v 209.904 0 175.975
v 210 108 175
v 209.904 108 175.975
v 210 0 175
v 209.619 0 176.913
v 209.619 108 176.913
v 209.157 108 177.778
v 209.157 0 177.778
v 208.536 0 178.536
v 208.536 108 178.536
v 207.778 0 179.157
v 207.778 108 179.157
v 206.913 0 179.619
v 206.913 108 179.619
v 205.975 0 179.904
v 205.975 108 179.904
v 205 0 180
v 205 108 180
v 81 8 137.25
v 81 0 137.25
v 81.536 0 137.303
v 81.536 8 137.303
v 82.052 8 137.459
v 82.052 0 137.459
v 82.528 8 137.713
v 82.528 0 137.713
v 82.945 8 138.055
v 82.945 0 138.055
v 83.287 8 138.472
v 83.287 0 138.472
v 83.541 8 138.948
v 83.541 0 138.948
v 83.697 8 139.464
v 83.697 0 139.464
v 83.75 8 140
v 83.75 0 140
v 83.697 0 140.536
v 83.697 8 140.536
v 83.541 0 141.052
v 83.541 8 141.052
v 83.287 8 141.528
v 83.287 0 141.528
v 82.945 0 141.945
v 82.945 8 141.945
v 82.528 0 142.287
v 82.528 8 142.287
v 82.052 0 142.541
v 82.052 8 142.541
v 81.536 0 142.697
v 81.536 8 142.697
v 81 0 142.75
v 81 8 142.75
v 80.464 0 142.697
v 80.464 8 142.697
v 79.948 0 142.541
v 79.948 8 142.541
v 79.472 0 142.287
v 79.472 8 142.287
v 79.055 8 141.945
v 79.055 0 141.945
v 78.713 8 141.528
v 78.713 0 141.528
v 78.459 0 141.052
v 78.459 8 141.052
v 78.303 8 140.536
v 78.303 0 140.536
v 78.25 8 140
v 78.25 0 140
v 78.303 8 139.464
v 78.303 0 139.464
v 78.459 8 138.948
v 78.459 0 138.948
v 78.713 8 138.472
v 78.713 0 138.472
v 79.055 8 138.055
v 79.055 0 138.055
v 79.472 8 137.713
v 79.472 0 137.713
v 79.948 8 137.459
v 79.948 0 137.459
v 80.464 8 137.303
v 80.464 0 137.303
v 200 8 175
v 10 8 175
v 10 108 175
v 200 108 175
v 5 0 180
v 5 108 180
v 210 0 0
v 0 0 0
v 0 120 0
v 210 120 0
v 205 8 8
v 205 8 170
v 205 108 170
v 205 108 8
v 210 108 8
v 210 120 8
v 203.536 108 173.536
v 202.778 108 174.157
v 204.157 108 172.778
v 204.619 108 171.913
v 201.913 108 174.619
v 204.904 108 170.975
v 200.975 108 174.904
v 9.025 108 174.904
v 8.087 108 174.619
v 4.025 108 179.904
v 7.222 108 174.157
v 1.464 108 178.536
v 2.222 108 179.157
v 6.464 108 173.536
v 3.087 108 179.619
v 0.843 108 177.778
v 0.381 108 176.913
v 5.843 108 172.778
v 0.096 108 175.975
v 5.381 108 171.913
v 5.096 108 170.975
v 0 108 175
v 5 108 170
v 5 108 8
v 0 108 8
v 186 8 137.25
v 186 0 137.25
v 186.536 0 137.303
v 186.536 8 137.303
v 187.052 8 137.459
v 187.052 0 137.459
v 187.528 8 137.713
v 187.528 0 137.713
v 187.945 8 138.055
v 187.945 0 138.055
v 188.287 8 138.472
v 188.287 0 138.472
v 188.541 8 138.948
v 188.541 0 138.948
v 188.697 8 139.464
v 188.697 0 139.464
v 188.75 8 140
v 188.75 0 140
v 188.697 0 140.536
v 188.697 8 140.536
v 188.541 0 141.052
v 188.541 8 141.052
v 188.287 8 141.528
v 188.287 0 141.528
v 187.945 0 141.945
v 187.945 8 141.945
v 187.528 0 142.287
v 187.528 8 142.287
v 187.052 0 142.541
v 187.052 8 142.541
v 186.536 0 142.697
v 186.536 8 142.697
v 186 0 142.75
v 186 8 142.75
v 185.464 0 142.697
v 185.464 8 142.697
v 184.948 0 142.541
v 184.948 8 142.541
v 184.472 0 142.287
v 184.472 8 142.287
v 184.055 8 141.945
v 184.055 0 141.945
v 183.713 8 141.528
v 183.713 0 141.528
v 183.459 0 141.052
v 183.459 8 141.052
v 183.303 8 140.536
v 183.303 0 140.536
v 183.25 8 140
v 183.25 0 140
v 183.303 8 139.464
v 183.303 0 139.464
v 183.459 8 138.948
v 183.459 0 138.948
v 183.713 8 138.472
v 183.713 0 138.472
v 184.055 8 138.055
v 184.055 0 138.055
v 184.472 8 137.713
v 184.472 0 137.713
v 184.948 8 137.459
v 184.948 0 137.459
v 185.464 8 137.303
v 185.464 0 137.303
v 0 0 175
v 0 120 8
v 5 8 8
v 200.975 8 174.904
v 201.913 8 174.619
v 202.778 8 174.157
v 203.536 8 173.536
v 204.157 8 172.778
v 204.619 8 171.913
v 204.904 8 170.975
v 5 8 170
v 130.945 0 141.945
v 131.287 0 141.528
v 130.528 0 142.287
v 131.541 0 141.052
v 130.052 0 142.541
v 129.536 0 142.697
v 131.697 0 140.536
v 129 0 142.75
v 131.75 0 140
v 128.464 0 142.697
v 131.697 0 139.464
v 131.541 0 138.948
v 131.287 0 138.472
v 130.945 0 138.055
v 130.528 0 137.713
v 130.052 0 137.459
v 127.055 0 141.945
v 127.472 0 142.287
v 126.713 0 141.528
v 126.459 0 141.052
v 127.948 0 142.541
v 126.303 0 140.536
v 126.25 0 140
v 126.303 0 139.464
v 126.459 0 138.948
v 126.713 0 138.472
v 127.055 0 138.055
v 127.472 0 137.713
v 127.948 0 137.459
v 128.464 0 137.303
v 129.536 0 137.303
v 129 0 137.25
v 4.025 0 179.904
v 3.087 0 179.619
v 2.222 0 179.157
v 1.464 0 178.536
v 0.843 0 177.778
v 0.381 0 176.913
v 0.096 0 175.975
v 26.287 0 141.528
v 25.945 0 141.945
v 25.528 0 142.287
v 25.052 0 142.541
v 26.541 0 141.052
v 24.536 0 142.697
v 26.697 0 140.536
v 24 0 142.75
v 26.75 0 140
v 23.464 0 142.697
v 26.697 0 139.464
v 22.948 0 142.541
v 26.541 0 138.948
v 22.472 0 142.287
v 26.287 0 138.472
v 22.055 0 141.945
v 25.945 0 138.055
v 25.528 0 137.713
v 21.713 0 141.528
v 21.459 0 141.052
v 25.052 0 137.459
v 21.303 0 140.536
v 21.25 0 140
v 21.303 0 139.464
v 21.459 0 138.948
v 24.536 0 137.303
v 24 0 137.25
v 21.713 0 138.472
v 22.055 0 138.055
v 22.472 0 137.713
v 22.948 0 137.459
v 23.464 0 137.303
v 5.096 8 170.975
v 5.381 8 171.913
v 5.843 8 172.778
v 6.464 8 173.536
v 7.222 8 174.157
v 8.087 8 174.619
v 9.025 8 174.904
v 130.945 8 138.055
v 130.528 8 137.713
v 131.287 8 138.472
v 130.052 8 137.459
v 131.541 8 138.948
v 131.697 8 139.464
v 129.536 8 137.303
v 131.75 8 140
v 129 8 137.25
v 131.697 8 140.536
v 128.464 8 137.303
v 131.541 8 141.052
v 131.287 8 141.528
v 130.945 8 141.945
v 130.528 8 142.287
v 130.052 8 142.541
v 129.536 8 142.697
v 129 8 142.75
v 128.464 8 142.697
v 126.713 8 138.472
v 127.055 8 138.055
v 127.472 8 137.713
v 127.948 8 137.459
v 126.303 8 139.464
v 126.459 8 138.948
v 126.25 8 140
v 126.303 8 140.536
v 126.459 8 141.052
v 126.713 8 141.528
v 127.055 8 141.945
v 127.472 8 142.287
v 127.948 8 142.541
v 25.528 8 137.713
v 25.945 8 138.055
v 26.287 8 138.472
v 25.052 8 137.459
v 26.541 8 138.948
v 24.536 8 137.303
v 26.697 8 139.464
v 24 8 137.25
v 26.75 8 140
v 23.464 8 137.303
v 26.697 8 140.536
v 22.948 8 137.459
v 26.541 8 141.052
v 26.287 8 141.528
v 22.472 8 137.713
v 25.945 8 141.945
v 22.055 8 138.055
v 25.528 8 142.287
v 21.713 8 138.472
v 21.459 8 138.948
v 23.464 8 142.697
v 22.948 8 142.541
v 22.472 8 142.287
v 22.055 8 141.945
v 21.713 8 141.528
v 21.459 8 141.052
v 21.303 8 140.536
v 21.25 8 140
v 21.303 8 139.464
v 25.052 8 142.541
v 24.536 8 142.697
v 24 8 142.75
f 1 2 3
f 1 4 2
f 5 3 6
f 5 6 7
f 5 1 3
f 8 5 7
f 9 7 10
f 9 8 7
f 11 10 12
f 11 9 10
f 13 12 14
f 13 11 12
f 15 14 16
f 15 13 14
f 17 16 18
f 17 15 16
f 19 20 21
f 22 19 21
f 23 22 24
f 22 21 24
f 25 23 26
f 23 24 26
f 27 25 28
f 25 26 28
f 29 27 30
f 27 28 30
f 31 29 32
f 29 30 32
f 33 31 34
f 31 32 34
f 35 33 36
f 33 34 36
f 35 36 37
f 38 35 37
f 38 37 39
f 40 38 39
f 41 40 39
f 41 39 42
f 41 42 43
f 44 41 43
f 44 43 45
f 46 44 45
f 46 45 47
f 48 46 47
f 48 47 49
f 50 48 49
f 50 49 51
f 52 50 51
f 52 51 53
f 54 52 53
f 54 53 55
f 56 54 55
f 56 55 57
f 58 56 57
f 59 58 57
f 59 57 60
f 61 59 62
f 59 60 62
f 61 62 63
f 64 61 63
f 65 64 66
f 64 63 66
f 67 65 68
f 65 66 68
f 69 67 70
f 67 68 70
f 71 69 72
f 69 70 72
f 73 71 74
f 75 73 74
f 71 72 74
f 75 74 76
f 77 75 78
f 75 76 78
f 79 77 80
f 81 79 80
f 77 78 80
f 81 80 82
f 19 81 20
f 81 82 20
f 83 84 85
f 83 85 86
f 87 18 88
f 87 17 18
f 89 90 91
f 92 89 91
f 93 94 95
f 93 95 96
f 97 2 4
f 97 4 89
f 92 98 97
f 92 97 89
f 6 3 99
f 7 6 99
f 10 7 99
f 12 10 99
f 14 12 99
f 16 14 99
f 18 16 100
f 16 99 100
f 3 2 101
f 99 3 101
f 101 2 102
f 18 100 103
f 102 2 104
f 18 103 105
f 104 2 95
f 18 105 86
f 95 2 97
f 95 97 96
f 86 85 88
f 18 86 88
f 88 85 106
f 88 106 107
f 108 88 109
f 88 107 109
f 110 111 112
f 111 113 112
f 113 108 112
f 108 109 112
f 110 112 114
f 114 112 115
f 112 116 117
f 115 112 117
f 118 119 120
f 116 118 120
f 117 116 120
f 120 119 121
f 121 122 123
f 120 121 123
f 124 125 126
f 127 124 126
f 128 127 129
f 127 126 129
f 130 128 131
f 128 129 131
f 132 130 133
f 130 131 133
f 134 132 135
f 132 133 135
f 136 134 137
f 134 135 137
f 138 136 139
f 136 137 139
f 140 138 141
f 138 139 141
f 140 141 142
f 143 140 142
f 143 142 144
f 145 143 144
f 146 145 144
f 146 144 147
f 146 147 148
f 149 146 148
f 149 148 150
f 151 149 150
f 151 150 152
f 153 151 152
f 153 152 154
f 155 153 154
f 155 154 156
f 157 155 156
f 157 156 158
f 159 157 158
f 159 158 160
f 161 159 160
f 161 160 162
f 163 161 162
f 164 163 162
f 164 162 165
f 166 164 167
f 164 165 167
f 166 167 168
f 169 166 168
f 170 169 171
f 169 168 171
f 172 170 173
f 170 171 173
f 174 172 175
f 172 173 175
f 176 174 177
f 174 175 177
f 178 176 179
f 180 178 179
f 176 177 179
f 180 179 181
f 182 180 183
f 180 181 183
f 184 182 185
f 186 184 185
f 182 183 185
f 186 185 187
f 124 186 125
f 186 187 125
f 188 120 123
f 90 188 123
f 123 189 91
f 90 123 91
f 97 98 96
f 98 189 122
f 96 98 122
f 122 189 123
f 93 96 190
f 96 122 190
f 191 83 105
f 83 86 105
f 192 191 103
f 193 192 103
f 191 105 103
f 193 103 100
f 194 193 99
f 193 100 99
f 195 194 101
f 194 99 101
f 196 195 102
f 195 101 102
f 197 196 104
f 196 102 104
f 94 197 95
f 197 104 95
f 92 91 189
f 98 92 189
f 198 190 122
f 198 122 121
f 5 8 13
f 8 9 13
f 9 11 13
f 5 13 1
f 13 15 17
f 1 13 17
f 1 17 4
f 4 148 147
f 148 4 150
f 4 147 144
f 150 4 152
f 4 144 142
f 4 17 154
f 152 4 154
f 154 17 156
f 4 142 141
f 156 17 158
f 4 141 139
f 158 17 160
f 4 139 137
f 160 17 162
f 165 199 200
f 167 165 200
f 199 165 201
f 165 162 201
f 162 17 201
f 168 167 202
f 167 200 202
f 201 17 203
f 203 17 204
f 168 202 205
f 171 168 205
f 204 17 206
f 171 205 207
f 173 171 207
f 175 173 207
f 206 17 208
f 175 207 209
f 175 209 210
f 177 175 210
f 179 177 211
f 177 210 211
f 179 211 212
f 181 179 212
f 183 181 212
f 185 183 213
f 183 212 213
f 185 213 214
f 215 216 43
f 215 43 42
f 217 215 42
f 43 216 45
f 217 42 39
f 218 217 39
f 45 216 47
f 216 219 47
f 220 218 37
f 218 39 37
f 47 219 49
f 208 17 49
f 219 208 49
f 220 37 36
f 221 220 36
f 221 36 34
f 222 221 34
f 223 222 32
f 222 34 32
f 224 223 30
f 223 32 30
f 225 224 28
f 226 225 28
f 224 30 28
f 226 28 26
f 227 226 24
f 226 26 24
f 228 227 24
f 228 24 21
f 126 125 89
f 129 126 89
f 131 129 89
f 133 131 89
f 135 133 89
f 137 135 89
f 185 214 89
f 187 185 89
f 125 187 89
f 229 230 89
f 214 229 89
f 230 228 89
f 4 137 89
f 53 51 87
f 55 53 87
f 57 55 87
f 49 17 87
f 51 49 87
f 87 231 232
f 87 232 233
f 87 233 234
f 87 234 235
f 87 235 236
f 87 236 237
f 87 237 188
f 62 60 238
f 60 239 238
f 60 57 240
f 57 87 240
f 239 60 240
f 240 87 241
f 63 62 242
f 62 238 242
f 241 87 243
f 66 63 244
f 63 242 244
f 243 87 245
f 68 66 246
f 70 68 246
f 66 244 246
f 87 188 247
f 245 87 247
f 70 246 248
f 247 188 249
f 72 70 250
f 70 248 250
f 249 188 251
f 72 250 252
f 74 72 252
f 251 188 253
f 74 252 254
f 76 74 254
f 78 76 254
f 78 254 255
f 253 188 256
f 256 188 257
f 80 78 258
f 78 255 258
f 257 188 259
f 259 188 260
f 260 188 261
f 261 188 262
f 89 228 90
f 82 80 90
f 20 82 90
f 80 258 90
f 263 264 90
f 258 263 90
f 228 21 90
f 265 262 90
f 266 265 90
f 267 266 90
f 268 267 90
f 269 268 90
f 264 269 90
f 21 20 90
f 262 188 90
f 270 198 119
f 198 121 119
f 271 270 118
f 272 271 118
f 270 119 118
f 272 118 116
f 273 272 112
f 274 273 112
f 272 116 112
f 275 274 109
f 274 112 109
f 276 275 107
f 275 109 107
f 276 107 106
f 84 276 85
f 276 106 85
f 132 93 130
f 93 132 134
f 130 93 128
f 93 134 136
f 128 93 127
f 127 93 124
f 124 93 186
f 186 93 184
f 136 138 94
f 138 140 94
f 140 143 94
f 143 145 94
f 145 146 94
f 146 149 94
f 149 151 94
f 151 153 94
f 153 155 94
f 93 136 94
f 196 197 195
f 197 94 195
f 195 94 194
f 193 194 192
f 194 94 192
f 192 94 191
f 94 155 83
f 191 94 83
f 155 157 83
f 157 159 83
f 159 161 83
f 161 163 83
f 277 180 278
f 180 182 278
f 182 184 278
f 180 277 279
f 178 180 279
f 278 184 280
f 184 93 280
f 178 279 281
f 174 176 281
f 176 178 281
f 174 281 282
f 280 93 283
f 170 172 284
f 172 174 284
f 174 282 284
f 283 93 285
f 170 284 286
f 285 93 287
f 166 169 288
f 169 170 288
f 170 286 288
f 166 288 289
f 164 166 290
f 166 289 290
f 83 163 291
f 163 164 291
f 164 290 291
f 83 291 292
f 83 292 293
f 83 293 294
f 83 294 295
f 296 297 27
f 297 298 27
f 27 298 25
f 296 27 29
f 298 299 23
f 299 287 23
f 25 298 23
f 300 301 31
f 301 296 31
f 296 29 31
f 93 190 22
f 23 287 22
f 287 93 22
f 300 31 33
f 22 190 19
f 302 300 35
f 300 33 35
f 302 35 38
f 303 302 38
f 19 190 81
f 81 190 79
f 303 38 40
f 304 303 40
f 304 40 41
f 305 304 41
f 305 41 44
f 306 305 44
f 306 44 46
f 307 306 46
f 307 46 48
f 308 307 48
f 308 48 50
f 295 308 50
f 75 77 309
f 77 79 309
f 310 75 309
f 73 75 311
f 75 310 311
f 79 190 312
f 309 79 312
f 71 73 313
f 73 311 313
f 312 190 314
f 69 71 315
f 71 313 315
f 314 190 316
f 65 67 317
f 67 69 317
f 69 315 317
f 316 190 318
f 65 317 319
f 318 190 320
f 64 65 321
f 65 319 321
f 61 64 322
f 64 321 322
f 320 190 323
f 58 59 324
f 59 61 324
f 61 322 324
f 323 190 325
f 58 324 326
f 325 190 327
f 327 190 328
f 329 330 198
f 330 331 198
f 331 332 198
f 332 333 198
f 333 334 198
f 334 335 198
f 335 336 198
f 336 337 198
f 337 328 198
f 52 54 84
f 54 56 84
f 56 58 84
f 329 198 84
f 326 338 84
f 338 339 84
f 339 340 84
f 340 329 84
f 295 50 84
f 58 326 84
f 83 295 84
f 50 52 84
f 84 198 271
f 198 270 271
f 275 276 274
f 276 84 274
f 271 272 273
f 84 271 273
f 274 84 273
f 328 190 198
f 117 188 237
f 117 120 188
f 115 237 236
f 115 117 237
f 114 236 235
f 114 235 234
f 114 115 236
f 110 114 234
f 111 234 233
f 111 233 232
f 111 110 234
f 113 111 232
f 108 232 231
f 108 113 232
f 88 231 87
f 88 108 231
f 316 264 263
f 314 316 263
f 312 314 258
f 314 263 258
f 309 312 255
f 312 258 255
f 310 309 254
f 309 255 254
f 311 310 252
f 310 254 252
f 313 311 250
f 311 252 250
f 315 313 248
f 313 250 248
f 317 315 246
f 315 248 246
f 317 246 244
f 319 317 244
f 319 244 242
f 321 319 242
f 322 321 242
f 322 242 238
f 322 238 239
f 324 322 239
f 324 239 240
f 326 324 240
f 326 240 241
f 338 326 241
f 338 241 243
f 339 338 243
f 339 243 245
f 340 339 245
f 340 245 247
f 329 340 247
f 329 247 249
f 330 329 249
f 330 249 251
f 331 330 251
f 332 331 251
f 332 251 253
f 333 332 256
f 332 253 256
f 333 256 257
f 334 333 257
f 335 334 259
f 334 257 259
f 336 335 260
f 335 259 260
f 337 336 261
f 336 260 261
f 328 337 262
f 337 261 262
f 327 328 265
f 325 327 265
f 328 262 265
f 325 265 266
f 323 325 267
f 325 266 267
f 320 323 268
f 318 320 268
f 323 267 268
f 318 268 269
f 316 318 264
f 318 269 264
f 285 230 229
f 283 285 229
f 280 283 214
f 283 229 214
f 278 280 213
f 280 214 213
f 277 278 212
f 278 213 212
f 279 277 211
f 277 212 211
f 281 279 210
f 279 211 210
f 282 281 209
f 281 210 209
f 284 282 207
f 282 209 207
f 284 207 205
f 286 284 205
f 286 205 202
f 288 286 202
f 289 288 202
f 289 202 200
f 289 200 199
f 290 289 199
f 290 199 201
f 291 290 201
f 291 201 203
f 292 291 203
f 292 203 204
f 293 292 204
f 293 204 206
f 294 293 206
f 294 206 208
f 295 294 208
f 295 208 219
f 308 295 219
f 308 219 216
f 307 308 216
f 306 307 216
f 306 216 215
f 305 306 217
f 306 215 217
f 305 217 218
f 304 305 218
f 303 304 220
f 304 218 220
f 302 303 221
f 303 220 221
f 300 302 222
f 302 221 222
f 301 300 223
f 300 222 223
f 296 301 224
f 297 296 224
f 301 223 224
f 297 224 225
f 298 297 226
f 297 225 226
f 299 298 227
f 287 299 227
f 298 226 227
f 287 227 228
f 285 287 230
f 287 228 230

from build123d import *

# Parameters (mm, degrees)
BOSS_EXTRUDE1_DEPTH = 210
BOSS_EXTRUDE2_DEPTH = 100
SKETCH3_R           = 2.75
CUT_EXTRUDE1_DEPTH  = 20
FILLET1_R           = 5


with BuildPart() as part:
    # Sketch1 → Boss-Extrude1 (new body)
    with BuildSketch(Plane(origin=(0, 0, 0), x_dir=(0, 0, -1), z_dir=(1, 0, 0))):
        Polygon((0, 0), (0, 120), (-8, 120), (-8, 8), (-180, 8), (-180, 0), align=None)
    extrude(amount=BOSS_EXTRUDE1_DEPTH)

    # Sketch2 → Boss-Extrude2 (add)
    with BuildSketch(Plane(origin=(0, 8, 0), x_dir=(1, 0, 0), z_dir=(0, 1, 0))):
        Polygon((5, -8), (5, -175), (205, -175), (205, -8), (210, -8), (210, -180), (0, -180), (0, -8), align=None)
    extrude(amount=BOSS_EXTRUDE2_DEPTH)

    # Sketch3 → Cut-Extrude1 (cut)
    with BuildSketch(Plane.XZ):
        with Locations(Location((24, 140, 0), (0, 0, 270))):
            Circle(SKETCH3_R)
        with Locations(Location((81, 140, 0), (0, 0, 270))):
            Circle(SKETCH3_R)
        with Locations(Location((186, 140, 0), (0, 0, 270))):
            Circle(SKETCH3_R)
        with Locations(Location((129, 140, 0), (0, 0, 270))):
            Circle(SKETCH3_R)
    extrude(amount=-CUT_EXTRUDE1_DEPTH, mode=Mode.SUBTRACT)

    # Fillet1
    fillet1_edges = [part.edges().sort_by_distance(p)[0] for p in [
        (210, 54, 180),
        (205, 58, 175),
        (5, 58, 175),
        (0, 54, 180),
    ]]
    fillet(fillet1_edges, radius=FILLET1_R)


solid = part.part
